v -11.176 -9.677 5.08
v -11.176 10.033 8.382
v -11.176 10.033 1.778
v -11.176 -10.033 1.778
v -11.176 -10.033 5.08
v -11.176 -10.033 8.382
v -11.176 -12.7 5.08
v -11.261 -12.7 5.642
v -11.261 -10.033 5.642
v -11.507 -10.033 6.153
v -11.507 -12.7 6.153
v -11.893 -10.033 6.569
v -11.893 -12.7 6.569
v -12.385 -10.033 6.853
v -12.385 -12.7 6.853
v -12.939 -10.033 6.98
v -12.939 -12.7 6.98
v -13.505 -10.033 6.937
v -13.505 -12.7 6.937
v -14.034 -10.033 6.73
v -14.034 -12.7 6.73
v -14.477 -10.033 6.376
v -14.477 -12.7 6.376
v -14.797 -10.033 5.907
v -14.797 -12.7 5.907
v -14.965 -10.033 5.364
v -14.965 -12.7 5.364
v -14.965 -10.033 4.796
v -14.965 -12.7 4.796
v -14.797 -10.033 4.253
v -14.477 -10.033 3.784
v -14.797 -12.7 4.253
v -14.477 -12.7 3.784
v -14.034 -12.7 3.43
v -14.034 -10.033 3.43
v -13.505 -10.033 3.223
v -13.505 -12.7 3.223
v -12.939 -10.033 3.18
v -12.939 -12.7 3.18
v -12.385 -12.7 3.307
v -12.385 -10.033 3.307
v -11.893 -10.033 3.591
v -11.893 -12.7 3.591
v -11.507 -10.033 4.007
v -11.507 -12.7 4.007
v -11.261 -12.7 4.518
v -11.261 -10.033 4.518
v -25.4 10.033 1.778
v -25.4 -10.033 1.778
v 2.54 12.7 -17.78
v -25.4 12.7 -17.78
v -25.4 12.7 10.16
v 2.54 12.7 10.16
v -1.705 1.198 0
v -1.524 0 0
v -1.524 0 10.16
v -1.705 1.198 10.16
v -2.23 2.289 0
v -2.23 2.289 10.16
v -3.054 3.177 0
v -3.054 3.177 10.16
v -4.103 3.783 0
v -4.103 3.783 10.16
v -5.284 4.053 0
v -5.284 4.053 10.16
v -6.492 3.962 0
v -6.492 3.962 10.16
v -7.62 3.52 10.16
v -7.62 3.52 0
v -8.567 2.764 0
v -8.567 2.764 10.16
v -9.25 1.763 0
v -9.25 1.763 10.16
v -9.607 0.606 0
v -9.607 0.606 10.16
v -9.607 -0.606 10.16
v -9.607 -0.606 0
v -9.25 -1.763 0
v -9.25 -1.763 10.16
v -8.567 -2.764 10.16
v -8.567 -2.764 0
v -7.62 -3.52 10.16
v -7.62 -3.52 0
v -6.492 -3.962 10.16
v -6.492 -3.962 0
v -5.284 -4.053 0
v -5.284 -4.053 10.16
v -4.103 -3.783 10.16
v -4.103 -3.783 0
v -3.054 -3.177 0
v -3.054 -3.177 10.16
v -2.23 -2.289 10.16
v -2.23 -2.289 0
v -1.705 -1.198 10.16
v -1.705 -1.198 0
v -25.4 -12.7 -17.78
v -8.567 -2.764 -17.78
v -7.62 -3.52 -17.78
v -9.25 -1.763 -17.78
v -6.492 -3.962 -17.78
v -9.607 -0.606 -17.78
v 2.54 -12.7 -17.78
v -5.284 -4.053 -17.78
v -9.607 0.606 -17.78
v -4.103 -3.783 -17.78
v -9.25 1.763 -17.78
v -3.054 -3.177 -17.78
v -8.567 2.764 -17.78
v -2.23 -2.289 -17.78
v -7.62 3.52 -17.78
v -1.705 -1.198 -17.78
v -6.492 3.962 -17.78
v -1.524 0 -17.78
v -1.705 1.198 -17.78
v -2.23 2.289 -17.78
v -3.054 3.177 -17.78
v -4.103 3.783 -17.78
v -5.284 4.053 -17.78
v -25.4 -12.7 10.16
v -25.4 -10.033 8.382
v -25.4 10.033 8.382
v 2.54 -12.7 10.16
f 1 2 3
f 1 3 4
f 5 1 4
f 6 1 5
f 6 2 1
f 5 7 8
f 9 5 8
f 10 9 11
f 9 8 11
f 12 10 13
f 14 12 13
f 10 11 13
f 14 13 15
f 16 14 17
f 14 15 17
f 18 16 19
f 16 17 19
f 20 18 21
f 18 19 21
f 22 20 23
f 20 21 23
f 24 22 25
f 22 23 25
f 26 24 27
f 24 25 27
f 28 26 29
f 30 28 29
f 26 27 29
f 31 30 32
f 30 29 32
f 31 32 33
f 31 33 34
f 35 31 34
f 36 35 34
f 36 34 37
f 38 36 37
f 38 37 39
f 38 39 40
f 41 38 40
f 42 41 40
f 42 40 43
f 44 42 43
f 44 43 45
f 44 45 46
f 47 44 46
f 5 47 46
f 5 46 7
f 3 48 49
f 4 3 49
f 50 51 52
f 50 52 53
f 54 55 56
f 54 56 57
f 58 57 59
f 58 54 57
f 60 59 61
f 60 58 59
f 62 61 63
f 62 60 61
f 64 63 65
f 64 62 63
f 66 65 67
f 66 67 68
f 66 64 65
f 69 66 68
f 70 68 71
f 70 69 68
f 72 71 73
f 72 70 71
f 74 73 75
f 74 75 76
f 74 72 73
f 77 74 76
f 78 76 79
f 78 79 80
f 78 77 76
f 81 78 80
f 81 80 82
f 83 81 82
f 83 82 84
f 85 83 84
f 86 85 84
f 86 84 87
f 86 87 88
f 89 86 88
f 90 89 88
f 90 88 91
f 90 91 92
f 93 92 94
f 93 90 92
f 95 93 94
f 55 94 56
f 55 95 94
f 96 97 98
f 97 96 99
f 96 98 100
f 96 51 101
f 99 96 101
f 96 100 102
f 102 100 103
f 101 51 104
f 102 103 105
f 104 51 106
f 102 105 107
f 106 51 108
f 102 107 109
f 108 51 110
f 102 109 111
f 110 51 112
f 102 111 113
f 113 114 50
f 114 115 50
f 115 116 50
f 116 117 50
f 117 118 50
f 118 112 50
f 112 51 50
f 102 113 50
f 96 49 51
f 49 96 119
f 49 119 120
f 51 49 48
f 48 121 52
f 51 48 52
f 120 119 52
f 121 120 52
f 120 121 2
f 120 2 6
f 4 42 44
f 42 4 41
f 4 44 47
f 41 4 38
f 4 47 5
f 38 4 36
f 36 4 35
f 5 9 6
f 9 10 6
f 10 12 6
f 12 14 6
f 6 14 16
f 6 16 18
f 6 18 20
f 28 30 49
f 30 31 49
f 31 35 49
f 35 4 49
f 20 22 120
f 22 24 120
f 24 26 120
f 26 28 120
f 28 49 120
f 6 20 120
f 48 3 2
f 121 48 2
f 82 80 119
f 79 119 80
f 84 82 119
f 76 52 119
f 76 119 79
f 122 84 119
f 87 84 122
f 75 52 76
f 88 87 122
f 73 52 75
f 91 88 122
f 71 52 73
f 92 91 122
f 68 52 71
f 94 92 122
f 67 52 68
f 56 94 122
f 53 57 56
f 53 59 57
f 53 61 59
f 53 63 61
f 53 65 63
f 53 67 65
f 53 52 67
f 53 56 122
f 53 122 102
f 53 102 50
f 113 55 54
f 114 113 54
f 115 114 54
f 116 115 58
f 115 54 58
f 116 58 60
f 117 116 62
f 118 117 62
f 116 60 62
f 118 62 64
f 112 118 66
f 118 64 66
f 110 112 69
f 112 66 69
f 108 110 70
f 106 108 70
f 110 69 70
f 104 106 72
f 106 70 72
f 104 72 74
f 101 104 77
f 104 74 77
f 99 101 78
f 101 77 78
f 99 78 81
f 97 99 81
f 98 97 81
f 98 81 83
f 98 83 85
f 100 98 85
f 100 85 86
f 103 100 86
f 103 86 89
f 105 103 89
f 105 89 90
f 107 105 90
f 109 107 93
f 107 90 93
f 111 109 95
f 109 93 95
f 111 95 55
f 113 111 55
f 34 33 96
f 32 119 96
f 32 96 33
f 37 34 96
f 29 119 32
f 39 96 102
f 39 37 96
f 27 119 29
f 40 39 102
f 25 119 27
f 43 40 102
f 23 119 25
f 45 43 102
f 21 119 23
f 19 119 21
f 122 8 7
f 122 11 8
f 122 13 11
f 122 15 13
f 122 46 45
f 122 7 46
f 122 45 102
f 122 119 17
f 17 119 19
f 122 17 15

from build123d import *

# Parameters (mm, degrees)
F0_W     = 27.94
F0_H     = 25.4
F0_R     = 4.064
F1_DEPTH = 10.16
F2_W     = 20.066
F2_H     = 6.604
F3_DEPTH = 14.224
F4_R     = 1.905
F5_DEPTH = 3.0226
F6_DEPTH = 17.78


with BuildPart() as f1:
    # F0 (on Top) → F1 (new body)
    with BuildSketch(Plane.XY):
        with Locations((-11.43, 0)):
            Rectangle(F0_W, F0_H)
        with Locations((-5.588, 0)):
            Circle(F0_R, mode=Mode.SUBTRACT)
    extrude(amount=F1_DEPTH)

    # F2 (on face) → F3 (cut)
    with BuildSketch(Plane(origin=(-25.4, 0, 0), x_dir=(0, -1, 0), z_dir=(-1, 0, 0))):
        with Locations((0, 5.08)):
            Rectangle(F2_W, F2_H)
    extrude(amount=-F3_DEPTH, mode=Mode.SUBTRACT)

    # F4 (on face) → F5 (cut)
    with BuildSketch(Plane.XZ.offset(12.7)):
        with Locations((-13.081, 5.08)):
            Circle(F4_R)
    extrude(amount=-F5_DEPTH, mode=Mode.SUBTRACT)

    # F0 (on Top) → F6 (join)
    with BuildSketch(Plane.XY):
        with Locations((-11.43, 0)):
            Rectangle(F0_W, F0_H)
        with Locations((-5.588, 0)):
            Circle(F0_R, mode=Mode.SUBTRACT)
    extrude(amount=-F6_DEPTH)


solid = f1.part
